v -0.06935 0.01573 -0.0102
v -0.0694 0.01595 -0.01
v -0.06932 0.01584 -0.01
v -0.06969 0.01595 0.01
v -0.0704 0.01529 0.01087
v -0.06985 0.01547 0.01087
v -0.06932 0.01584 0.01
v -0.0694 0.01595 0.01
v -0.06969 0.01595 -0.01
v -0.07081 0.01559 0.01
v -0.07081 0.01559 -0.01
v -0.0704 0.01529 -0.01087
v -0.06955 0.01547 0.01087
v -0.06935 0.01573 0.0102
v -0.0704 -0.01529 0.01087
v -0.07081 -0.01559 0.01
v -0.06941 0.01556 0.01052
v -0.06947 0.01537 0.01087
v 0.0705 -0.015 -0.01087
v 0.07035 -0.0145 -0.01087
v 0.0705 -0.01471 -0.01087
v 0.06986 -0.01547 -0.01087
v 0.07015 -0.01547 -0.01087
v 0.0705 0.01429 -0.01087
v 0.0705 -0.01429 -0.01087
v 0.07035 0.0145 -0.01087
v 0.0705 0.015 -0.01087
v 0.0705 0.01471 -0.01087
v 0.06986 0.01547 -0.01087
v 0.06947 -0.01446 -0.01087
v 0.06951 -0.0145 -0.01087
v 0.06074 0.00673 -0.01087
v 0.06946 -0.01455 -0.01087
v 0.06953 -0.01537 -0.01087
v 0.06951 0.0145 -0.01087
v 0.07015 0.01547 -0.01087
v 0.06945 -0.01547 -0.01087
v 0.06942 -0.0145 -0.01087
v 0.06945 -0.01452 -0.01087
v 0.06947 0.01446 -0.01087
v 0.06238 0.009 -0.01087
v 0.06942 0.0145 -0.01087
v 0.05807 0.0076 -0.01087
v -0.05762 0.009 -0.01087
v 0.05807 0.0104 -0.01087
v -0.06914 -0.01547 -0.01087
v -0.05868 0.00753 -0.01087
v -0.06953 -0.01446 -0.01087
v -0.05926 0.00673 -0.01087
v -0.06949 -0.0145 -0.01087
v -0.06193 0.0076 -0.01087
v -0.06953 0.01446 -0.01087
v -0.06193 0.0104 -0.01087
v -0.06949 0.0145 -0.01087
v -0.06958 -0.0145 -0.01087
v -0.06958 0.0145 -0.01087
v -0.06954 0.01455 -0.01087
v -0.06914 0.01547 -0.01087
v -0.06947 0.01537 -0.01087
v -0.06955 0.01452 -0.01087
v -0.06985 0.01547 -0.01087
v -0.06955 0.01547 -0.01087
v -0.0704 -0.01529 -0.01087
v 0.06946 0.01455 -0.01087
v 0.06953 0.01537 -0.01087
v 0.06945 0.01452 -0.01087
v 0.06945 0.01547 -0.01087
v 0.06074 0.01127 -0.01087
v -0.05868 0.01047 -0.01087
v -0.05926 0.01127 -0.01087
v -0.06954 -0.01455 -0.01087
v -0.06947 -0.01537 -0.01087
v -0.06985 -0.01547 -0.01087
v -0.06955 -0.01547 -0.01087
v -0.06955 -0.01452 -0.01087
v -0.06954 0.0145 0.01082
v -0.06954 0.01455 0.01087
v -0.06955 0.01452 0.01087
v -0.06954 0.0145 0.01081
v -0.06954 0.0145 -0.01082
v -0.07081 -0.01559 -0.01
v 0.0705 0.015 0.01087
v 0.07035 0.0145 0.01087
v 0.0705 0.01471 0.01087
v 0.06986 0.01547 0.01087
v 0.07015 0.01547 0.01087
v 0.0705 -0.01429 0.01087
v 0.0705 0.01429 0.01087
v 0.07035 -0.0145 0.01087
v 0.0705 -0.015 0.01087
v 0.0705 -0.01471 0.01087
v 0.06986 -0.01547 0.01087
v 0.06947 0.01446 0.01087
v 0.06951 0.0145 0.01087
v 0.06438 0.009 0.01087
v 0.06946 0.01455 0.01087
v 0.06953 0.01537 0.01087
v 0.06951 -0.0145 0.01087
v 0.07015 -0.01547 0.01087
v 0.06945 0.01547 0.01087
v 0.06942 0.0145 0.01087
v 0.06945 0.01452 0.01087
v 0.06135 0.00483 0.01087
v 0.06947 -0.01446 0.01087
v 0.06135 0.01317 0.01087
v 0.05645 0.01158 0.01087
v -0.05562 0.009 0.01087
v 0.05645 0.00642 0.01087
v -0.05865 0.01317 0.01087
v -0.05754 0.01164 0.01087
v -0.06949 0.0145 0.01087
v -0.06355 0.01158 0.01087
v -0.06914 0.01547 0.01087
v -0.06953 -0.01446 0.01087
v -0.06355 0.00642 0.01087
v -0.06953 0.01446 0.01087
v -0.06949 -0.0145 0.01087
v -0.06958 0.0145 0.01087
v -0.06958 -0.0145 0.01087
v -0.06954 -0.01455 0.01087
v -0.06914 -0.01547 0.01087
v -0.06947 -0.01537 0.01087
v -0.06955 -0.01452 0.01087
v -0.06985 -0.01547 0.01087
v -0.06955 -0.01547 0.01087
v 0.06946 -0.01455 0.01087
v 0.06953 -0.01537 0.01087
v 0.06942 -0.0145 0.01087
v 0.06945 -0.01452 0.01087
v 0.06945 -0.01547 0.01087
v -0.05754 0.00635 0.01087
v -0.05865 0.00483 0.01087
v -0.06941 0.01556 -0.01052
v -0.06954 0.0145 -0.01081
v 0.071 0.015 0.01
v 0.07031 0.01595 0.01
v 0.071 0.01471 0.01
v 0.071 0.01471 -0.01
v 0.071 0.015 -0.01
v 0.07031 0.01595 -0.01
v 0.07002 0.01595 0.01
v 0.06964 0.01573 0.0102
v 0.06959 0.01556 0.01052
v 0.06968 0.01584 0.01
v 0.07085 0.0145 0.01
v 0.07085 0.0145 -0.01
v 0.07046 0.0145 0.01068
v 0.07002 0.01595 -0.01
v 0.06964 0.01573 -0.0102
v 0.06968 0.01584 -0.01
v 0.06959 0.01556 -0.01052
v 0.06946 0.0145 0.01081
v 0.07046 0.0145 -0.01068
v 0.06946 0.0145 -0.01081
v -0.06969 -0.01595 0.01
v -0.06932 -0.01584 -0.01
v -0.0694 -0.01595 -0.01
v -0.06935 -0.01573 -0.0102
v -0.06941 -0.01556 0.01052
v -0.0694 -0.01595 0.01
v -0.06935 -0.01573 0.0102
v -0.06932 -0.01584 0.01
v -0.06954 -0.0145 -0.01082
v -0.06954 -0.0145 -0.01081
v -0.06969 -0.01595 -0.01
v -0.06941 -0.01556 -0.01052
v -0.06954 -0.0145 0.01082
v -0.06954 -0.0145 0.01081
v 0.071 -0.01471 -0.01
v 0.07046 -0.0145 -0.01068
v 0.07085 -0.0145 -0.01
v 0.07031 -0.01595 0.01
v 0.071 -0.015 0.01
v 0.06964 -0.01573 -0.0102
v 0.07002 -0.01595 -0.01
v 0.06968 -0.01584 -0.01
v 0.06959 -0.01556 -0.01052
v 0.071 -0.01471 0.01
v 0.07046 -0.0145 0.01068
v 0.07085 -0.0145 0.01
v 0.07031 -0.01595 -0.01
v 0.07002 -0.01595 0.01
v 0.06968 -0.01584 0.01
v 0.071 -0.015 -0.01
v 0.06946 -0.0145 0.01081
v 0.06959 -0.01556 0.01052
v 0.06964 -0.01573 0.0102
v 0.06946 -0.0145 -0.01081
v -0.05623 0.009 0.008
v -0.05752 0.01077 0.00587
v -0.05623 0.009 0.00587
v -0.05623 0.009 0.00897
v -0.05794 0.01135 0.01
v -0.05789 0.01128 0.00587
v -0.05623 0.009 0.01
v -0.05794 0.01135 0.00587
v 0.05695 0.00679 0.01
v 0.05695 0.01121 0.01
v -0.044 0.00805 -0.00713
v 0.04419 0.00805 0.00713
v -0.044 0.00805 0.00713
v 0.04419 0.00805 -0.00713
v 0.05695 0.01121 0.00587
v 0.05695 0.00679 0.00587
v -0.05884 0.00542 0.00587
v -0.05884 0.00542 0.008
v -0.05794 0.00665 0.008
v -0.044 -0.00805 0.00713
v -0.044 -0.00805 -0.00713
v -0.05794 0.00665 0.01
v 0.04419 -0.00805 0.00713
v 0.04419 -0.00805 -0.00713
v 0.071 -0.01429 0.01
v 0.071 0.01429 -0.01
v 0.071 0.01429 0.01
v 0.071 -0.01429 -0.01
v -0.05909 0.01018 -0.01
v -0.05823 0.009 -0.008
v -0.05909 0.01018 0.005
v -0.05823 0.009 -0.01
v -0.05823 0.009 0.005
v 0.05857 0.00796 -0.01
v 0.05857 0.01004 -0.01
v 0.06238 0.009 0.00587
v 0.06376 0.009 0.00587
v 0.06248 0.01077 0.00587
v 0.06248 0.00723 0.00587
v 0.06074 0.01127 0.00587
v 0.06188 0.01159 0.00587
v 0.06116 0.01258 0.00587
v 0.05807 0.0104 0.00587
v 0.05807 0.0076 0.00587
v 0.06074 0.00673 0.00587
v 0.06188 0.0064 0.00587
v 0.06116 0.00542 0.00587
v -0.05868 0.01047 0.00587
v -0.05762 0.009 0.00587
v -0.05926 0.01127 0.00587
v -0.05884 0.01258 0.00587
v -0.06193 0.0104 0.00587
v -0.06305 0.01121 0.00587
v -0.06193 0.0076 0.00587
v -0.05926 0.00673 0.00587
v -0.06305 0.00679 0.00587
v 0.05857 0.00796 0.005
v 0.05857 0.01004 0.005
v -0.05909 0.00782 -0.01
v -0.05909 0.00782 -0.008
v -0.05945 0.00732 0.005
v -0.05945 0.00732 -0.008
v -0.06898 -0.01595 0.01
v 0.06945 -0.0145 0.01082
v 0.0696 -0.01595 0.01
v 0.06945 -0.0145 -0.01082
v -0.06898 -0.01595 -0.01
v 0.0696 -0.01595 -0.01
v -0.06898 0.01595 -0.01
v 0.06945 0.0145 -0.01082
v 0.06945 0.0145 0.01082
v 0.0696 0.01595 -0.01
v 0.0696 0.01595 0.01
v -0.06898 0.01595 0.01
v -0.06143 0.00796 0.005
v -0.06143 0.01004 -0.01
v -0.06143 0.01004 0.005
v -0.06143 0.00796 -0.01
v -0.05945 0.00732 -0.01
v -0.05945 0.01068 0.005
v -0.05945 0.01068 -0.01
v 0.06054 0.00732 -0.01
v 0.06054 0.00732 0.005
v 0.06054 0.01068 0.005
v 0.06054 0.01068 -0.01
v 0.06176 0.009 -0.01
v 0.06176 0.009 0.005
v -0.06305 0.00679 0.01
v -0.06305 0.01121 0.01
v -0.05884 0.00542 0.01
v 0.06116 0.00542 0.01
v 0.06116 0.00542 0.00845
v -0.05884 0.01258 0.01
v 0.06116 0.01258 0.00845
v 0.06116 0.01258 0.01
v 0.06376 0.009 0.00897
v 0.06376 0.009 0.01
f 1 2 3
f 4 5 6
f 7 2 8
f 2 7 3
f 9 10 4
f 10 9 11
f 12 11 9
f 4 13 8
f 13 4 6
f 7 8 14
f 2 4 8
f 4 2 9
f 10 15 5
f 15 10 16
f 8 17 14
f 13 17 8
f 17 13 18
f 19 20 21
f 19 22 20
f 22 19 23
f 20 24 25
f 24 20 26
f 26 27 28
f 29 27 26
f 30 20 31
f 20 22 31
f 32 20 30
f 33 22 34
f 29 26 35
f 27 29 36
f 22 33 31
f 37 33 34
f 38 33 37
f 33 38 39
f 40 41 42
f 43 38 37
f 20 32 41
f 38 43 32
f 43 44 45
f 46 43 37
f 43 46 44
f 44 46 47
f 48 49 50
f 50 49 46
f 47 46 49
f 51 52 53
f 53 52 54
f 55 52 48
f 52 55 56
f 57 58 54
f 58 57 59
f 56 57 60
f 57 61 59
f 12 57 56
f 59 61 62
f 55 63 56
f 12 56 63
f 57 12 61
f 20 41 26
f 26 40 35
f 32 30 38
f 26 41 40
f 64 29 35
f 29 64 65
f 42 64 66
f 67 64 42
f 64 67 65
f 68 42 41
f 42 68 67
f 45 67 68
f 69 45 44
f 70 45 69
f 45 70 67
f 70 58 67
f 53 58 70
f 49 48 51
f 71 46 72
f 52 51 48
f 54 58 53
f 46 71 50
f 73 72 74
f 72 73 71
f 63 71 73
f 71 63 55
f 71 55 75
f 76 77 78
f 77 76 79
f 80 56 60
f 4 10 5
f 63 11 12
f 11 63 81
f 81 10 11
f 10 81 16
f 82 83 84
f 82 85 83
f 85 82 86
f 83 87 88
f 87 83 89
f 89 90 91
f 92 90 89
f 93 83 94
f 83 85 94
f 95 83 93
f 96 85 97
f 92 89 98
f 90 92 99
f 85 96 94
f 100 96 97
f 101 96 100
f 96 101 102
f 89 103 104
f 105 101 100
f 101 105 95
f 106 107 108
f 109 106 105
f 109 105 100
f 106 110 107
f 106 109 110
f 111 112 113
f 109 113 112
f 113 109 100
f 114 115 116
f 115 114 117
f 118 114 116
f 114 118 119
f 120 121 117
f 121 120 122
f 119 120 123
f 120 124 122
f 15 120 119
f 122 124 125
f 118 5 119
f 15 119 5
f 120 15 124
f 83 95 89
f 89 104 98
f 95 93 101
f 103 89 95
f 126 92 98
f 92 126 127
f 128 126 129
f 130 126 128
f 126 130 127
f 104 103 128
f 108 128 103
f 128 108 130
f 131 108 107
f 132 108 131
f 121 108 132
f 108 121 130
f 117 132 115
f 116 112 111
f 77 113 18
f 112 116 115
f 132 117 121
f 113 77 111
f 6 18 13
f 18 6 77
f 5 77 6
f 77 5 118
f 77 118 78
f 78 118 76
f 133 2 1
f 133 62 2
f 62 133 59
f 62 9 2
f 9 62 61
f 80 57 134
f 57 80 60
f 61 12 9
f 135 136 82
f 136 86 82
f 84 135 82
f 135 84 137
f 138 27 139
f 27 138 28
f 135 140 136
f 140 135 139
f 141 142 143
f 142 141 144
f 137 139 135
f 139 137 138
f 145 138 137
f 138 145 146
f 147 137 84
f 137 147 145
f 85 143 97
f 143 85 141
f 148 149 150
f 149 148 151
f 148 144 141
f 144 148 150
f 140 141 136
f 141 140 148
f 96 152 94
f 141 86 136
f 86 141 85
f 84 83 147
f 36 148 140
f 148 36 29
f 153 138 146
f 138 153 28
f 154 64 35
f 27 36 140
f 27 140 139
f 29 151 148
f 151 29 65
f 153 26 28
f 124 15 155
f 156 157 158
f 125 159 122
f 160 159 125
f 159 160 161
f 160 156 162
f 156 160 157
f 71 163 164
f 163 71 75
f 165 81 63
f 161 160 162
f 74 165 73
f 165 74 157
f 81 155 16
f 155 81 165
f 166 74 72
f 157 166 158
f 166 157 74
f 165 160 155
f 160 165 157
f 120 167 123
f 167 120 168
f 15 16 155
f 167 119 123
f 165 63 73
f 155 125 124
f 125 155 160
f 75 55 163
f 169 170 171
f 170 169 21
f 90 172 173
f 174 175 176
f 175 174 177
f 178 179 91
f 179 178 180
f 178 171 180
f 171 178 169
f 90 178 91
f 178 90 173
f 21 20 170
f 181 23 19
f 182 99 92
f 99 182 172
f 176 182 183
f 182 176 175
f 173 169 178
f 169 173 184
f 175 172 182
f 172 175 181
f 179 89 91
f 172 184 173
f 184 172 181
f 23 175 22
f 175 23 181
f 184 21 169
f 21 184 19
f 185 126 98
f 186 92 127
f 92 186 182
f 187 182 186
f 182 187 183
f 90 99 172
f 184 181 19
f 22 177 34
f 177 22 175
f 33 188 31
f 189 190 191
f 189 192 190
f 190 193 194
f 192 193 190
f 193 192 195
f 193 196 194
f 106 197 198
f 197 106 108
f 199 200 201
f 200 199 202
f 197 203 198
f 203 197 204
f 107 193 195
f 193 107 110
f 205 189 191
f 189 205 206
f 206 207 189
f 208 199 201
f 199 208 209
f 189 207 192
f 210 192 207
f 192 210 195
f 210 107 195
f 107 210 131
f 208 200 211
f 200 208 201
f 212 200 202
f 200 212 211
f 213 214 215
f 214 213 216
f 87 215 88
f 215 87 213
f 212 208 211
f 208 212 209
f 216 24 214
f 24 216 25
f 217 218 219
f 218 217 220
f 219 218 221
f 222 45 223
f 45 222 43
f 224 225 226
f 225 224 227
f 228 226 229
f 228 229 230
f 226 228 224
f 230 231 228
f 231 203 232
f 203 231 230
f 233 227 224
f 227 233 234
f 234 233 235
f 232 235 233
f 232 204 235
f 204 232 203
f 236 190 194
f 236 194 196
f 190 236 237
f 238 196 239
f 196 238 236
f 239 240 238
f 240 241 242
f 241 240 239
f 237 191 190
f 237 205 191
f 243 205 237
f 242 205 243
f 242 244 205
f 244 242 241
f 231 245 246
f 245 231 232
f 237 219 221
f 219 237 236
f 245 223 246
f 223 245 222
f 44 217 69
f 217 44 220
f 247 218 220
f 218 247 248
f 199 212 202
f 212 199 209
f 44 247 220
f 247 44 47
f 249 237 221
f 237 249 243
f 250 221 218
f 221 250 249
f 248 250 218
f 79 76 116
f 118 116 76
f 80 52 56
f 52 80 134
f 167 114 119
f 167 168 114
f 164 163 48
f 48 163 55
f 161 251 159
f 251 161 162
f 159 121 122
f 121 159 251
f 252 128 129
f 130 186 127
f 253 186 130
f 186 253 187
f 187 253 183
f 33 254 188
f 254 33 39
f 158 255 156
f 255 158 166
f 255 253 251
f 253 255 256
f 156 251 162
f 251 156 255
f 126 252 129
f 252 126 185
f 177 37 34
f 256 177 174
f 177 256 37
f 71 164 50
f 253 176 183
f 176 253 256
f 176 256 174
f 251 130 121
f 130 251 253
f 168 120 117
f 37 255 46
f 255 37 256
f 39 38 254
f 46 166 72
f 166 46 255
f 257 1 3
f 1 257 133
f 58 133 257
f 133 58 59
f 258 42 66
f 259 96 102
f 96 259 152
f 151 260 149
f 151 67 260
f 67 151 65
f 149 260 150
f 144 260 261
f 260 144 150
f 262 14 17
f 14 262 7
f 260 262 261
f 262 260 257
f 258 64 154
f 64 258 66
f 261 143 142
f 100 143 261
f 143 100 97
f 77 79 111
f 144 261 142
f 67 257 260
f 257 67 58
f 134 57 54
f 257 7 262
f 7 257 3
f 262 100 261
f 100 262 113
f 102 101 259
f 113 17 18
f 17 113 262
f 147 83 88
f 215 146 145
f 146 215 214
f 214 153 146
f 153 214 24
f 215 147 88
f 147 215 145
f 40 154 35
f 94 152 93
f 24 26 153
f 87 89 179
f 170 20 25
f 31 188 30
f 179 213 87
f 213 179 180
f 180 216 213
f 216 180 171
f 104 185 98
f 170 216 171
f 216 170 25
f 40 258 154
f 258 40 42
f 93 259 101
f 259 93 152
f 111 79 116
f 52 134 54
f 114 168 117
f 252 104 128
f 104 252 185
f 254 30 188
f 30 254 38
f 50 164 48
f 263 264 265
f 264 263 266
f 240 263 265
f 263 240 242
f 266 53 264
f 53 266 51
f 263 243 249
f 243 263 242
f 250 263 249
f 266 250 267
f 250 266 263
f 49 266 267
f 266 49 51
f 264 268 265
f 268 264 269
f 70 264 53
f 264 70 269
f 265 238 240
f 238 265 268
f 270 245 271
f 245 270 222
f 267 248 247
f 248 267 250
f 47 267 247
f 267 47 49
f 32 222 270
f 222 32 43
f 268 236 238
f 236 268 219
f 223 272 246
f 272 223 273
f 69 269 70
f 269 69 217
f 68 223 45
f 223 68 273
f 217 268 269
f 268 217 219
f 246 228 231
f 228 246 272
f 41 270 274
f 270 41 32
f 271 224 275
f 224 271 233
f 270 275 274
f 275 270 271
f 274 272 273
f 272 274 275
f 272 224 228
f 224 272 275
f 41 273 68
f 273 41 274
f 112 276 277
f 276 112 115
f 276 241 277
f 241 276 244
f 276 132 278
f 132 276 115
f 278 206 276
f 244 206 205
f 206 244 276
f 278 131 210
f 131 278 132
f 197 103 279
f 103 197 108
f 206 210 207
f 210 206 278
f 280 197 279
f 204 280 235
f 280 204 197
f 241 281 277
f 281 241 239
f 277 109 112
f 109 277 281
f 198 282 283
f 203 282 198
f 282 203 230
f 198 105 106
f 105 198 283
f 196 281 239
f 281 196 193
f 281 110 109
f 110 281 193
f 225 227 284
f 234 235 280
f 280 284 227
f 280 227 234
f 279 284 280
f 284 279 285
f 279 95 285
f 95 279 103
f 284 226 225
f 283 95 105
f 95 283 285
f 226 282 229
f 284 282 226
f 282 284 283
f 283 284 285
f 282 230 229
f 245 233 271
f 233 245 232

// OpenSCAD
// Parameters
L = 0.14; //[0.07:0.28:0.001]
W = 0.03; //[0.015:0.06:0.001]
H = 0.02; //[0.01:0.04:0.001]
cut_L = 0.09; //[0.045:0.18:0.001]
cut_W = 0.018; //[0.009:0.036:0.001]
cut_H = 0.014; //[0.007:0.028:0.001]
web_t = 0.003; //[0.0015:0.006:0.0005]
end_len = 0.025; //[0.0125:0.05:0.001]
hole_d = 0.006; //[0.003:0.012:0.0005]
hole_offset_L = 0.01; //[0.005:0.02:0.001]
hole_offset_W = 0.006; //[0.003:0.012:0.001]
cs_d = 0.01; //[0.005:0.02:0.0005]
cs_depth = 0.004; //[0.002:0.008:0.0005]
eps = 0.001; //[0.0005:0.002:0.0005]
chamfer = 0.001; //[0.0005:0.002:0.0005]
fillet_r = 0.001; //[0.0005:0.002:0.0005]

// Base Shapes
module outer_body() {
  cube([L, W, H], center=true);
}

module central_rectangular_cutout() {
  cube([cut_L, cut_W, cut_H + 2*eps], center=true);
}

module end_block_hole_left() {
  translate([-L/2 + hole_offset_L, W/2 - hole_offset_W, 0])
    cylinder(h=H + 2*eps, r=hole_d/2, center=true);
}

module end_block_hole_right() {
  translate([L/2 - hole_offset_L, W/2 - hole_offset_W, 0])
    cylinder(h=H + 2*eps, r=hole_d/2, center=true);
}

module hole_countersink_or_counterbore_left() {
  translate([-L/2 + hole_offset_L, W/2 - hole_offset_W, H/2 - (cs_depth + eps)/2])
    cylinder(h=cs_depth + eps, r=cs_d/2, center=true);
}

module hole_countersink_or_counterbore_right() {
  translate([L/2 - hole_offset_L, W/2 - hole_offset_W, H/2 - (cs_depth + eps)/2])
    cylinder(h=cs_depth + eps, r=cs_d/2, center=true);
}

module edge_chamfer_cut(position) {
  translate(position)
    rotate([0, 0, 45])
      cube([chamfer, chamfer, H + 2*eps], center=true);
}

module fillet_sphere() {
  sphere(r=fillet_r, center=true);
}

// Operations
module edge_chamfers() {
  union() {
    edge_chamfer_cut([-L/2 + chamfer/2, W/2 - chamfer/2, 0]);
    edge_chamfer_cut([L/2 - chamfer/2, W/2 - chamfer/2, 0]);
    edge_chamfer_cut([-L/2 + chamfer/2, -W/2 + chamfer/2, 0]);
    edge_chamfer_cut([L/2 - chamfer/2, -W/2 + chamfer/2, 0]);
  }
}

module u_bracket_no_holes() {
  difference() {
    outer_body();
    central_rectangular_cutout();
    edge_chamfers();
  }
}

module u_bracket_with_holes() {
  difference() {
    u_bracket_no_holes();
    end_block_hole_left();
    end_block_hole_right();
    hole_countersink_or_counterbore_left();
    hole_countersink_or_counterbore_right();
  }
}

module edge_fillets() {
  minkowski() {
    u_bracket_with_holes();
    fillet_sphere();
  }
}

// Final Output
edge_fillets();
